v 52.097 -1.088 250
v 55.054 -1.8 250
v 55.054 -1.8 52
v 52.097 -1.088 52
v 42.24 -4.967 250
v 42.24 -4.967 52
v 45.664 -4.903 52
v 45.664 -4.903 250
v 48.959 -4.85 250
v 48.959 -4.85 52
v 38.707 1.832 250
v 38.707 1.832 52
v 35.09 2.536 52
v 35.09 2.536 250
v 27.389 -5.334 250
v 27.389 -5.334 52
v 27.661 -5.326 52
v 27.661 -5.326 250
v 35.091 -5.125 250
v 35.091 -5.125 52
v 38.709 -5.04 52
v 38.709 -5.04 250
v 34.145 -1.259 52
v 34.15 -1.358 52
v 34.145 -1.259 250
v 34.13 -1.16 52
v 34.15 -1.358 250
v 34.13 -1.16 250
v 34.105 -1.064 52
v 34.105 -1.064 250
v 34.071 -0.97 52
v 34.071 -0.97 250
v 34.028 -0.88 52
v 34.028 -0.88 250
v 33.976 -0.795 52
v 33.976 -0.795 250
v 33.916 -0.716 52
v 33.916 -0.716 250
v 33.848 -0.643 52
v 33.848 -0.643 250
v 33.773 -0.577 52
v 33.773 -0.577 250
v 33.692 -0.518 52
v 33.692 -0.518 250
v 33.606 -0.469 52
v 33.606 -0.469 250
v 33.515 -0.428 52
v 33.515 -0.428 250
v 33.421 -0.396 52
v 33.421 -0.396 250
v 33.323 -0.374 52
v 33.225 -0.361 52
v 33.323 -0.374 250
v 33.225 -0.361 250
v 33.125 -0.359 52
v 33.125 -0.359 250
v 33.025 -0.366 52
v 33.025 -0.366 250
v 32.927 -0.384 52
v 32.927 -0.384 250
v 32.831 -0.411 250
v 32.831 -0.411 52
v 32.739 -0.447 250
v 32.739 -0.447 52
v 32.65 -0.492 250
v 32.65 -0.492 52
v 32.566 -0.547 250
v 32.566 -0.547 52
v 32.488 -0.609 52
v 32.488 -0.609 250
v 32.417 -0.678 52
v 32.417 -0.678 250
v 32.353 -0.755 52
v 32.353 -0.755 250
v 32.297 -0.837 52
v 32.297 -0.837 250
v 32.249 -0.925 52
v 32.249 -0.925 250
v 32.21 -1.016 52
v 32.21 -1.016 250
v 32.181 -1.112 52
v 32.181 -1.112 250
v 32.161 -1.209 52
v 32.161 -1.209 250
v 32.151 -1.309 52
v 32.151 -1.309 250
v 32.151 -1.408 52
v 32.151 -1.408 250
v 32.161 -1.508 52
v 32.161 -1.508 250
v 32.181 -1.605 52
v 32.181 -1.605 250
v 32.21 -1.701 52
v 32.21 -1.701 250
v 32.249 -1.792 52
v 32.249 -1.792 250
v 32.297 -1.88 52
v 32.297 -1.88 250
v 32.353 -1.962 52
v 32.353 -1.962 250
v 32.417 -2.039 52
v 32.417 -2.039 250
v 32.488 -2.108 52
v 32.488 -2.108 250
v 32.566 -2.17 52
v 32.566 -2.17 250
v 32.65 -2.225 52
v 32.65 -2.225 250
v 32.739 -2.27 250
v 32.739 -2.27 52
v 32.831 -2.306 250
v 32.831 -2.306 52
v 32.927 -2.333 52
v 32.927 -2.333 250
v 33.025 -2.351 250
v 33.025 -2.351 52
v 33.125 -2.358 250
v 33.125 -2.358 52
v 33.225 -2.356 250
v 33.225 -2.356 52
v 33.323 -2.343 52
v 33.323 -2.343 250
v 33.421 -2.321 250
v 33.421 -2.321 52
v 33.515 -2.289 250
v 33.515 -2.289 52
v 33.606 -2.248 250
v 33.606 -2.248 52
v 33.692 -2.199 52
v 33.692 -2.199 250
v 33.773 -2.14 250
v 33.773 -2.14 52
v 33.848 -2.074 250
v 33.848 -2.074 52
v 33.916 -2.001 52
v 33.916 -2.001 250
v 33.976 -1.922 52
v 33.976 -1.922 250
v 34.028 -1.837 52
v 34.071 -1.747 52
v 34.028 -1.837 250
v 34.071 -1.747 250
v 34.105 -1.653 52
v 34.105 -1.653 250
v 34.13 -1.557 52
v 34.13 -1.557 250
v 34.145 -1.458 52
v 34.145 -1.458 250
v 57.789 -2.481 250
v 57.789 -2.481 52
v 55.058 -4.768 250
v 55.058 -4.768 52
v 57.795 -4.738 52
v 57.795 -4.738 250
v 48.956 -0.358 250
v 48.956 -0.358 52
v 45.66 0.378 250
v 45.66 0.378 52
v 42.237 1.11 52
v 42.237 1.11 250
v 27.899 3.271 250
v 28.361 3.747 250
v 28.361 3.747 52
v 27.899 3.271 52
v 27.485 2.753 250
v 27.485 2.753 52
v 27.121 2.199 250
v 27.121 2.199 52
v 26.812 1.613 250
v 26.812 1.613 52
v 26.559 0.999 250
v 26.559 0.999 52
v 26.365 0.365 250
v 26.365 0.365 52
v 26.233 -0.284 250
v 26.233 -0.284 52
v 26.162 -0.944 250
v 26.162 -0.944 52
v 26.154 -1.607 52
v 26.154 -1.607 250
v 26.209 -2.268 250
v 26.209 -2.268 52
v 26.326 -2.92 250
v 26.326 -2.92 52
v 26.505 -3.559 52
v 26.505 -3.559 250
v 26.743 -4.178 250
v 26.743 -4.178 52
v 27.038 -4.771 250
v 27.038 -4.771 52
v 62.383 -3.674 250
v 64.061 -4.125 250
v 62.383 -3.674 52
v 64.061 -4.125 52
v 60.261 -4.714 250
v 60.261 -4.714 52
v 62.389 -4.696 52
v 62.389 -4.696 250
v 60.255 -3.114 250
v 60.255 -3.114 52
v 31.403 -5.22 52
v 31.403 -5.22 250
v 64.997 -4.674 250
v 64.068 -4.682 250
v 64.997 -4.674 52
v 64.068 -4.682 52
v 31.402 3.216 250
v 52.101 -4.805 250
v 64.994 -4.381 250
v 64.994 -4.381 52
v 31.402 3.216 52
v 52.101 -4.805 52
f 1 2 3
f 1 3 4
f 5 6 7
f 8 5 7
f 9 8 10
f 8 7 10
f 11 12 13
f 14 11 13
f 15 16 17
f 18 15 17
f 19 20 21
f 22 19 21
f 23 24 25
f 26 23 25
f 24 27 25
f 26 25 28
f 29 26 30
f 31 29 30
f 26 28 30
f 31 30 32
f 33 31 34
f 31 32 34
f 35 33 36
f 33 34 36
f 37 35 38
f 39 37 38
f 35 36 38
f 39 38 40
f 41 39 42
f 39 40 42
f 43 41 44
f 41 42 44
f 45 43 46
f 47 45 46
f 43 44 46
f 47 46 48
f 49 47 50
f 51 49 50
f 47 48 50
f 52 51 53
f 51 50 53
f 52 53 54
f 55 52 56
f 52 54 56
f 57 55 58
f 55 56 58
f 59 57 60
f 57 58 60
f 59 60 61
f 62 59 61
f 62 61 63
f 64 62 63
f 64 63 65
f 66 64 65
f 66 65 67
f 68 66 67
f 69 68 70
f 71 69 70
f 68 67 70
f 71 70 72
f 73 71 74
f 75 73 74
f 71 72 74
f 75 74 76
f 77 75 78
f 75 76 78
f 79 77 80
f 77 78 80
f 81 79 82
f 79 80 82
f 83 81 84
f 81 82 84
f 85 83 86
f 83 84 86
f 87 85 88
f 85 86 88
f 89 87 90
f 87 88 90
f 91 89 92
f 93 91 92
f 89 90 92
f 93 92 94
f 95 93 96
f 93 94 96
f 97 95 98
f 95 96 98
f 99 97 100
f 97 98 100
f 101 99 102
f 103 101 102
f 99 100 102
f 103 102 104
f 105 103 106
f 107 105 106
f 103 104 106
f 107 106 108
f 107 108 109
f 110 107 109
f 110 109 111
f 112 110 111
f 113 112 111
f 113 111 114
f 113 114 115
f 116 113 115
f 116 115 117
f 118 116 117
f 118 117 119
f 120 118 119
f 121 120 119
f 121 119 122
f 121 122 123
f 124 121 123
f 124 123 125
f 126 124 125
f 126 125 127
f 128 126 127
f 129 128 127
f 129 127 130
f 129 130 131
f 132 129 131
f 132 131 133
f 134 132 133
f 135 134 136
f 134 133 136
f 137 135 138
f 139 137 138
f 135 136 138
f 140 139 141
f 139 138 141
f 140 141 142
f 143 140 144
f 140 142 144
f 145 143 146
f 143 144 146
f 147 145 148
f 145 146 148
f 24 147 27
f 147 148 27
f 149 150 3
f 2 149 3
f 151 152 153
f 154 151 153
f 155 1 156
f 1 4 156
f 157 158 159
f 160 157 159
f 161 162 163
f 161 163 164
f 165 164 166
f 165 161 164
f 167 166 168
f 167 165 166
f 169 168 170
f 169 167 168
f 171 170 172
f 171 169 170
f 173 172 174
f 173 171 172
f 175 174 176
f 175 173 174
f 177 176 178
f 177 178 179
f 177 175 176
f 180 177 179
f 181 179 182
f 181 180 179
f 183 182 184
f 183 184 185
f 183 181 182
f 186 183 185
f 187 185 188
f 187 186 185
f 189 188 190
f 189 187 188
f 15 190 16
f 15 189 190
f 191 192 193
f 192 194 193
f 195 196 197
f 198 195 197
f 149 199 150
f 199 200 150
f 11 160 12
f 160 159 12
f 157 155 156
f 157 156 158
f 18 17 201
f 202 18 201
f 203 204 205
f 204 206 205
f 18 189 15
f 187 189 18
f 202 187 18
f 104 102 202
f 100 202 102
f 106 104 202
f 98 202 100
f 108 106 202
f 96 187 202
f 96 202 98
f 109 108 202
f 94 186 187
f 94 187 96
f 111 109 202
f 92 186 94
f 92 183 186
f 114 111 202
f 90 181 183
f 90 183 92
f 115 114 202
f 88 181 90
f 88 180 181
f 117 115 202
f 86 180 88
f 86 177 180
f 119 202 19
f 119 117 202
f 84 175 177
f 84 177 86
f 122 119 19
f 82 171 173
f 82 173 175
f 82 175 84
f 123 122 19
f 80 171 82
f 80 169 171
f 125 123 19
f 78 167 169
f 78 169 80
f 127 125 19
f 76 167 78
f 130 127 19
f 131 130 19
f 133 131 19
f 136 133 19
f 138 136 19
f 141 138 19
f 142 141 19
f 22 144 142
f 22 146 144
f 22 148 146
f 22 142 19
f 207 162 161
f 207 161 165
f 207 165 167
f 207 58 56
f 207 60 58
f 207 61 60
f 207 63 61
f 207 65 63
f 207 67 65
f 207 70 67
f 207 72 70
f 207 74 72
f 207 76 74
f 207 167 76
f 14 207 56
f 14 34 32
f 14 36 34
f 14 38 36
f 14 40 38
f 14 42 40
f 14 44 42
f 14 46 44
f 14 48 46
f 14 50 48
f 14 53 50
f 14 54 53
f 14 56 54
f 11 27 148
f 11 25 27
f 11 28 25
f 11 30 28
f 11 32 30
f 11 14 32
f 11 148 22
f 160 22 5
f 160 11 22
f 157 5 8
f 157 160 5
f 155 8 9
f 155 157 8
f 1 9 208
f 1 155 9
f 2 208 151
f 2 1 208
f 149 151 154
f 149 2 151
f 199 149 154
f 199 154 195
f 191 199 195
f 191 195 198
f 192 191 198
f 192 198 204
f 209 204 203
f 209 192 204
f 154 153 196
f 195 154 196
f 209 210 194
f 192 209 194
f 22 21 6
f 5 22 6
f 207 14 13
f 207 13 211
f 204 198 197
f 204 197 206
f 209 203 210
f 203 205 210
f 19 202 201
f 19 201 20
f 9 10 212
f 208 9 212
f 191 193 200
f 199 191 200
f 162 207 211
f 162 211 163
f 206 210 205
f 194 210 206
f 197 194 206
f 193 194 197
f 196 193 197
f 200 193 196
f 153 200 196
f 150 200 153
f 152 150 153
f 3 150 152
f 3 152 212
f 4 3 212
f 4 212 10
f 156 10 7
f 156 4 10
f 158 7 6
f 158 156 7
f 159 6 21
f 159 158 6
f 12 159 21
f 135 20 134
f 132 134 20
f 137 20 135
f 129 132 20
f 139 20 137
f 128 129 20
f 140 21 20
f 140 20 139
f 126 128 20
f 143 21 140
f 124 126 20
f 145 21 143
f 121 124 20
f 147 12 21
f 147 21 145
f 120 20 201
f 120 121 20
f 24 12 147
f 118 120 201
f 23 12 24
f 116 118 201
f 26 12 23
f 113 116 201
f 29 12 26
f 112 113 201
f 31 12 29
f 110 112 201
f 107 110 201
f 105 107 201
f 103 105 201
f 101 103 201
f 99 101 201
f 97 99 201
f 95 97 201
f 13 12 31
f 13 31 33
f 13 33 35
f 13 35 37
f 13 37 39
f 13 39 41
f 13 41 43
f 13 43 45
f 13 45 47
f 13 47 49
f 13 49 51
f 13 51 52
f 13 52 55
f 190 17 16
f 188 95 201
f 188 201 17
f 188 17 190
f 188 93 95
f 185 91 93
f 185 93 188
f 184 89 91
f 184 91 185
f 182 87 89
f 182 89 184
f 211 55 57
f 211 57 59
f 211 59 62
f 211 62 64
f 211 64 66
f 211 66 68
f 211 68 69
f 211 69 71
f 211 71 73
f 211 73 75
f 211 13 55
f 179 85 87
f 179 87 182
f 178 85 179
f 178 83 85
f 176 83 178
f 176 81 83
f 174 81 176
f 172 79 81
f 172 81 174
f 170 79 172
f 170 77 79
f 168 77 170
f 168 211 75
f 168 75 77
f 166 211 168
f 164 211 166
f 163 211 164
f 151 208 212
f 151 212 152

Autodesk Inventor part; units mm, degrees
ref_plane "YZ Plane" through (0, 0, 0) normal (1, 0, 0) x (0, 1, 0)
ref_plane "XZ Plane" through (0, 0, 0) normal (0, 1, 0) x (-1, 0, 0)
sketch "Náčrt1" plane through (-64.9965, -4.5129, 0) normal (0, 0, 1) x (1, 0, 0)
  line L0 (0, 0) -> (0.1008, -0.6172)
  line L1 (0.1008, -0.6172) -> (0.4005, -1.1751)
  line L2 (0.4005, -1.1751) -> (0.8948, -1.675)
  line L3 (0.8948, -1.675) -> (1.5794, -2.1181)
  line L4 (1.5794, -2.1181) -> (2.45, -2.5059)
  line L5 (2.45, -2.5059) -> (3.502, -2.8399)
  line L6 (3.502, -2.8399) -> (4.7309, -3.1217)
  line L7 (4.7309, -3.1217) -> (6.1321, -3.3532)
  line L8 (6.1321, -3.3532) -> (7.7009, -3.5364)
  line L9 (7.7009, -3.5364) -> (9.4326, -3.6734)
  line L10 (9.4326, -3.6734) -> (11.3221, -3.7667)
  line L11 (11.3221, -3.7667) -> (13.3646, -3.8188)
  line L12 (13.3646, -3.8188) -> (15.5549, -3.8188)
  line L13 (15.5549, -3.8188) -> (17.8877, -3.8188)
  line L14 (17.8877, -3.8188) -> (20.3578, -3.7585)
  line L15 (20.3578, -3.7585) -> (22.9603, -3.695)
  line L16 (22.9603, -3.695) -> (25.688, -3.5719)
  line L17 (25.688, -3.5719) -> (28.5365, -3.4433)
  line L18 (28.5365, -3.4433) -> (31.5001, -3.3096)
  line L19 (31.5001, -3.3096) -> (34.5717, -3.1509)
  line L20 (34.5717, -3.1509) -> (37.7458, -2.9903)
  line L21 (37.7458, -2.9903) -> (41.0158, -2.8272)
  line L22 (41.0158, -2.8272) -> (44.3749, -2.6597)
  line L23 (44.3749, -2.6597) -> (47.817, -2.512)
  line L24 (47.817, -2.512) -> (51.3342, -2.369)
  line L25 (51.3342, -2.369) -> (54.9194, -2.2327)
  line L26 (54.9194, -2.2327) -> (58.5651, -2.0885)
  line L27 (58.5651, -2.0885) -> (62.2634, -1.9385)
  line L28 (62.2634, -1.9385) -> (66.0059, -1.7856)
  line L29 (66.0059, -1.7856) -> (69.7841, -1.632)
  line L30 (69.7841, -1.632) -> (73.5888, -1.4803)
  line L31 (73.5888, -1.4803) -> (77.4106, -1.3325)
  line L32 (77.4106, -1.3325) -> (85.0644, -1.0556)
  line L33 (85.0644, -1.0556) -> (88.8745, -0.9296)
  line L34 (88.8745, -0.9296) -> (92.6573, -0.8132)
  line L35 (92.6573, -0.8132) -> (96.3998, -0.7072)
  line L36 (96.3998, -0.7072) -> (100.0878, -0.612)
  line L37 (100.0878, -0.612) -> (103.7057, -0.5276)
  line L38 (103.7057, -0.5276) -> (107.2363, -0.4539)
  line L39 (107.2363, -0.4539) -> (110.6603, -0.3905)
  line L40 (110.6603, -0.3905) -> (113.9558, -0.3368)
  line L41 (113.9558, -0.3368) -> (117.0974, -0.2918)
  line L42 (117.0974, -0.2918) -> (120.055, -0.2549)
  line L43 (120.055, -0.2549) -> (122.7911, -0.2251)
  line L44 (122.7911, -0.2251) -> (125.2574, -0.2014)
  line L45 (125.2574, -0.2014) -> (127.3856, -0.1834)
  line L46 (127.3856, -0.1834) -> (129.0641, -0.1691)
  line L47 (129.0641, -0.1691) -> (129.9931, -0.1612)
  line L48 (129.9931, -0.1612) -> (129.9906, 0.1321)
  line L49 (129.9906, 0.1321) -> (129.0576, 0.3875)
  line L50 (129.0576, 0.3875) -> (127.3795, 0.839)
  line L51 (127.3795, 0.839) -> (125.2516, 1.3993)
  line L52 (125.2516, 1.3993) -> (122.7858, 2.032)
  line L53 (122.7858, 2.032) -> (120.0501, 2.7132)
  line L54 (120.0501, 2.7132) -> (117.0931, 3.4254)
  line L55 (117.0931, 3.4254) -> (113.952, 4.1548)
  line L56 (113.952, 4.1548) -> (110.657, 4.8904)
  line L57 (110.657, 4.8904) -> (107.2335, 5.6228)
  line L58 (107.2335, 5.6228) -> (103.7034, 6.3444)
  line L59 (103.7034, 6.3444) -> (100.086, 7.0485)
  line L60 (100.086, 7.0485) -> (96.3985, 7.7294)
  line L61 (96.3985, 7.7294) -> (92.6565, 8.3822)
  line L62 (92.6565, 8.3822) -> (88.8741, 9.0026)
  line L63 (88.8741, 9.0026) -> (85.0644, 9.5868)
  line L64 (85.0644, 9.5868) -> (81.2394, 10.1289)
  line L65 (81.2394, 10.1289) -> (77.4106, 10.6287)
  line L66 (77.4106, 10.6287) -> (73.5888, 11.0836)
  line L67 (73.5888, 11.0836) -> (69.7841, 11.4914)
  line L68 (69.7841, 11.4914) -> (66.0059, 11.8502)
  line L69 (66.0059, 11.8502) -> (62.2634, 12.1585)
  line L70 (62.2634, 12.1585) -> (58.5651, 12.4148)
  line L71 (58.5651, 12.4148) -> (54.9194, 12.6181)
  line L72 (54.9194, 12.6181) -> (51.3342, 12.7673)
  line L73 (51.3342, 12.7673) -> (47.817, 12.8447)
  line L74 (47.817, 12.8447) -> (44.3752, 12.8426)
  line L75 (44.3752, 12.8426) -> (41.0158, 12.7632)
  line L76 (41.0158, 12.7632) -> (37.7458, 12.6088)
  line L77 (37.7458, 12.6088) -> (34.5717, 12.3826)
  line L78 (34.5717, 12.3826) -> (31.4999, 12.088)
  line L79 (31.4999, 12.088) -> (28.5366, 11.7287)
  line L80 (28.5366, 11.7287) -> (25.688, 11.3091)
  line L81 (25.688, 11.3091) -> (22.9598, 10.8338)
  line L82 (22.9598, 10.8338) -> (20.3578, 10.3077)
  line L83 (20.3578, 10.3077) -> (17.8877, 9.7359)
  line L84 (17.8877, 9.7359) -> (15.5548, 9.1241)
  line L85 (15.5548, 9.1241) -> (13.3646, 8.4777)
  line L86 (13.3646, 8.4777) -> (11.3221, 7.8025)
  line L87 (11.3221, 7.8025) -> (9.4326, 7.1042)
  line L88 (9.4326, 7.1042) -> (7.7009, 6.3887)
  line L89 (7.7009, 6.3887) -> (6.1321, 5.6614)
  line L90 (6.1321, 5.6614) -> (4.7309, 4.928)
  line L91 (4.7309, 4.928) -> (3.502, 4.1935)
  line L92 (3.502, 4.1935) -> (2.45, 3.4628)
  line L93 (2.45, 3.4628) -> (1.5794, 2.7403)
  line L94 (1.5794, 2.7403) -> (0.8948, 2.0298)
  line L95 (0.8948, 2.0298) -> (0.4005, 1.3347)
  line L96 (0.4005, 1.3347) -> (0.1008, 0.6574)
  line L97 (0.1008, 0.6574) -> (0, 0)
  point P0 (81.2394, -1.1904)
extrude "Vysunutí1" add sketch "Náčrt1" along normal mid plane 500
sketch "Náčrt2" plane through (-64.9965, -4.5129, 250) normal (0, 0, 1) x (1, 0, 0)
  line L0 (92.6573, -0.8132) -> (88.8745, -0.9296) projected
  line L1 (92.6565, 8.3822) -> (96.3985, 7.7294) projected
  arc A0 (92.6565, 8.3822) -> (91.7048, -0.8425) centre (98.1463, 3.1544) ccw
  line L2 (91.7048, -0.8425) -> (107.6986, -0.3505)
  line L3 (129.9931, -0.1612) -> (125.2574, -0.2014) projected
  line L4 (107.6986, -0.3505) -> (129.9931, -0.1612)
  line L5 (129.9906, 0.1321) -> (129.0576, 0.3875) projected
  line L6 (129.9931, -0.1612) -> (129.9906, 0.1321)
  line L7 (129.9906, 0.1321) -> (93.9107, 9.4415)
  line L8 (93.9107, 9.4415) -> (92.6565, 8.3822)
  line L9 (91.7048, -0.8425) -> (93.0009, -2.4127)
  line L10 (93.0009, -2.4127) -> (129.9931, -0.1612)
  line L11 (129.9931, -0.1612) -> (130.1118, -0.1429)
  line L12 (130.1118, -0.1429) -> (130.1094, 0.1331)
  line L13 (130.1094, 0.1331) -> (129.9906, 0.1321)
  line L14 (130.1094, 0.1331) -> (128.1613, 1.4193)
  line L15 (128.1613, 1.4193) -> (113.3536, 4.4248)
  arc A1 (94.6886, 9.2408) -> (93.8369, -2.3619) centre (98.1463, 3.1544) ccw
  line L16 (93.9107, 9.4415) -> (51.1382, 19.7468)
  line L17 (51.1382, 19.7468) -> (-4.6438, 11.1084)
  line L18 (-4.6438, 11.1084) -> (-5.1693, -4.2224)
  line L19 (-5.1693, -4.2224) -> (7.217, -13.261)
  line L20 (7.217, -13.261) -> (66.9021, -8.7417)
  line L21 (66.9021, -8.7417) -> (87.61, -4.2224)
  line L22 (87.61, -4.2224) -> (93.0009, -2.4127)
  point P0 (0, 0)
  point P1 (92.6573, -0.8132)
  point P2 (125.2574, -0.2014)
  dimension "d6" = 14
ref_plane "Pracovní rovina1" through (0, 0, 0) normal (0, 0, 1) x (1, 0, 0)
extrude "Vysunutí3" cut sketch "Náčrt2" against normal through all contours A1 L10 L9 L0 | L0 A0 L1 A1 | L9 L22 L21 L20 L19 L18 L17 L16 L8 A0 | L1 L8 L7 A1
sketch "Náčrt4" plane through (-64.9965, -4.5129, -250) normal (0, 0, -1) x (-1, 0, 0)
  circle A0 centre (-88.2792, 18.8756) radius 51.6589
  point P0 (-64.9965, 4.5129)
extrude "Vysunutí4" cut sketch "Náčrt4" against normal blind 302
sketch "Náčrt5" plane through (-64.9965, -4.5129, 250) normal (0, 0, 1) x (1, 0, 0)
  arc A0 (93.3574, 8.2599) -> (92.3851, -0.8216) centre (98.1463, 3.1544) ccw projected
  line L0 (92.3851, -0.8216) -> (92.6573, -0.8132) projected
  line L1 (92.6573, -0.8132) -> (96.3998, -0.7072) projected
  line L2 (96.3998, -0.7072) -> (100.0878, -0.612) projected
  line L3 (100.0878, -0.612) -> (103.7057, -0.5276) projected
  line L4 (103.7057, -0.5276) -> (107.2363, -0.4539) projected
  line L5 (107.2363, -0.4539) -> (110.6603, -0.3905) projected
  line L6 (110.6603, -0.3905) -> (113.9558, -0.3368) projected
  line L7 (113.9558, -0.3368) -> (117.0974, -0.2918) projected
  line L8 (117.0974, -0.2918) -> (120.055, -0.2549) projected
  line L9 (120.055, -0.2549) -> (122.7911, -0.2251) projected
  line L10 (122.7911, -0.2251) -> (125.2574, -0.2014) projected
  line L11 (125.2574, -0.2014) -> (129.9931, -0.1612) projected
  line L12 (129.9931, -0.1612) -> (129.9906, 0.1321) projected
  line L13 (129.9906, 0.1321) -> (129.0576, 0.3875) projected
  line L14 (129.0576, 0.3875) -> (127.3795, 0.839) projected
  line L15 (127.3795, 0.839) -> (125.2516, 1.3993) projected
  line L16 (125.2516, 1.3993) -> (122.7858, 2.032) projected
  line L17 (122.7858, 2.032) -> (120.0501, 2.7132) projected
  line L18 (120.0501, 2.7132) -> (117.0931, 3.4254) projected
  line L19 (117.0931, 3.4254) -> (113.952, 4.1548) projected
  line L20 (113.952, 4.1548) -> (110.657, 4.8904) projected
  line L21 (110.657, 4.8904) -> (107.2335, 5.6228) projected
  line L22 (107.2335, 5.6228) -> (103.7034, 6.3444) projected
  line L23 (103.7034, 6.3444) -> (100.086, 7.0485) projected
  line L24 (100.086, 7.0485) -> (96.3985, 7.7294) projected
  line L25 (96.3985, 7.7294) -> (93.3574, 8.2599) projected
  circle A1 centre (98.1463, 3.1544) radius 1
  point P0 (64.9965, 4.5129)
  dimension "d11" = 2
extrude "Vysunutí5" cut sketch "Náčrt5" against normal through all contours A1
properties part number "pokus 1 flap 4412"
